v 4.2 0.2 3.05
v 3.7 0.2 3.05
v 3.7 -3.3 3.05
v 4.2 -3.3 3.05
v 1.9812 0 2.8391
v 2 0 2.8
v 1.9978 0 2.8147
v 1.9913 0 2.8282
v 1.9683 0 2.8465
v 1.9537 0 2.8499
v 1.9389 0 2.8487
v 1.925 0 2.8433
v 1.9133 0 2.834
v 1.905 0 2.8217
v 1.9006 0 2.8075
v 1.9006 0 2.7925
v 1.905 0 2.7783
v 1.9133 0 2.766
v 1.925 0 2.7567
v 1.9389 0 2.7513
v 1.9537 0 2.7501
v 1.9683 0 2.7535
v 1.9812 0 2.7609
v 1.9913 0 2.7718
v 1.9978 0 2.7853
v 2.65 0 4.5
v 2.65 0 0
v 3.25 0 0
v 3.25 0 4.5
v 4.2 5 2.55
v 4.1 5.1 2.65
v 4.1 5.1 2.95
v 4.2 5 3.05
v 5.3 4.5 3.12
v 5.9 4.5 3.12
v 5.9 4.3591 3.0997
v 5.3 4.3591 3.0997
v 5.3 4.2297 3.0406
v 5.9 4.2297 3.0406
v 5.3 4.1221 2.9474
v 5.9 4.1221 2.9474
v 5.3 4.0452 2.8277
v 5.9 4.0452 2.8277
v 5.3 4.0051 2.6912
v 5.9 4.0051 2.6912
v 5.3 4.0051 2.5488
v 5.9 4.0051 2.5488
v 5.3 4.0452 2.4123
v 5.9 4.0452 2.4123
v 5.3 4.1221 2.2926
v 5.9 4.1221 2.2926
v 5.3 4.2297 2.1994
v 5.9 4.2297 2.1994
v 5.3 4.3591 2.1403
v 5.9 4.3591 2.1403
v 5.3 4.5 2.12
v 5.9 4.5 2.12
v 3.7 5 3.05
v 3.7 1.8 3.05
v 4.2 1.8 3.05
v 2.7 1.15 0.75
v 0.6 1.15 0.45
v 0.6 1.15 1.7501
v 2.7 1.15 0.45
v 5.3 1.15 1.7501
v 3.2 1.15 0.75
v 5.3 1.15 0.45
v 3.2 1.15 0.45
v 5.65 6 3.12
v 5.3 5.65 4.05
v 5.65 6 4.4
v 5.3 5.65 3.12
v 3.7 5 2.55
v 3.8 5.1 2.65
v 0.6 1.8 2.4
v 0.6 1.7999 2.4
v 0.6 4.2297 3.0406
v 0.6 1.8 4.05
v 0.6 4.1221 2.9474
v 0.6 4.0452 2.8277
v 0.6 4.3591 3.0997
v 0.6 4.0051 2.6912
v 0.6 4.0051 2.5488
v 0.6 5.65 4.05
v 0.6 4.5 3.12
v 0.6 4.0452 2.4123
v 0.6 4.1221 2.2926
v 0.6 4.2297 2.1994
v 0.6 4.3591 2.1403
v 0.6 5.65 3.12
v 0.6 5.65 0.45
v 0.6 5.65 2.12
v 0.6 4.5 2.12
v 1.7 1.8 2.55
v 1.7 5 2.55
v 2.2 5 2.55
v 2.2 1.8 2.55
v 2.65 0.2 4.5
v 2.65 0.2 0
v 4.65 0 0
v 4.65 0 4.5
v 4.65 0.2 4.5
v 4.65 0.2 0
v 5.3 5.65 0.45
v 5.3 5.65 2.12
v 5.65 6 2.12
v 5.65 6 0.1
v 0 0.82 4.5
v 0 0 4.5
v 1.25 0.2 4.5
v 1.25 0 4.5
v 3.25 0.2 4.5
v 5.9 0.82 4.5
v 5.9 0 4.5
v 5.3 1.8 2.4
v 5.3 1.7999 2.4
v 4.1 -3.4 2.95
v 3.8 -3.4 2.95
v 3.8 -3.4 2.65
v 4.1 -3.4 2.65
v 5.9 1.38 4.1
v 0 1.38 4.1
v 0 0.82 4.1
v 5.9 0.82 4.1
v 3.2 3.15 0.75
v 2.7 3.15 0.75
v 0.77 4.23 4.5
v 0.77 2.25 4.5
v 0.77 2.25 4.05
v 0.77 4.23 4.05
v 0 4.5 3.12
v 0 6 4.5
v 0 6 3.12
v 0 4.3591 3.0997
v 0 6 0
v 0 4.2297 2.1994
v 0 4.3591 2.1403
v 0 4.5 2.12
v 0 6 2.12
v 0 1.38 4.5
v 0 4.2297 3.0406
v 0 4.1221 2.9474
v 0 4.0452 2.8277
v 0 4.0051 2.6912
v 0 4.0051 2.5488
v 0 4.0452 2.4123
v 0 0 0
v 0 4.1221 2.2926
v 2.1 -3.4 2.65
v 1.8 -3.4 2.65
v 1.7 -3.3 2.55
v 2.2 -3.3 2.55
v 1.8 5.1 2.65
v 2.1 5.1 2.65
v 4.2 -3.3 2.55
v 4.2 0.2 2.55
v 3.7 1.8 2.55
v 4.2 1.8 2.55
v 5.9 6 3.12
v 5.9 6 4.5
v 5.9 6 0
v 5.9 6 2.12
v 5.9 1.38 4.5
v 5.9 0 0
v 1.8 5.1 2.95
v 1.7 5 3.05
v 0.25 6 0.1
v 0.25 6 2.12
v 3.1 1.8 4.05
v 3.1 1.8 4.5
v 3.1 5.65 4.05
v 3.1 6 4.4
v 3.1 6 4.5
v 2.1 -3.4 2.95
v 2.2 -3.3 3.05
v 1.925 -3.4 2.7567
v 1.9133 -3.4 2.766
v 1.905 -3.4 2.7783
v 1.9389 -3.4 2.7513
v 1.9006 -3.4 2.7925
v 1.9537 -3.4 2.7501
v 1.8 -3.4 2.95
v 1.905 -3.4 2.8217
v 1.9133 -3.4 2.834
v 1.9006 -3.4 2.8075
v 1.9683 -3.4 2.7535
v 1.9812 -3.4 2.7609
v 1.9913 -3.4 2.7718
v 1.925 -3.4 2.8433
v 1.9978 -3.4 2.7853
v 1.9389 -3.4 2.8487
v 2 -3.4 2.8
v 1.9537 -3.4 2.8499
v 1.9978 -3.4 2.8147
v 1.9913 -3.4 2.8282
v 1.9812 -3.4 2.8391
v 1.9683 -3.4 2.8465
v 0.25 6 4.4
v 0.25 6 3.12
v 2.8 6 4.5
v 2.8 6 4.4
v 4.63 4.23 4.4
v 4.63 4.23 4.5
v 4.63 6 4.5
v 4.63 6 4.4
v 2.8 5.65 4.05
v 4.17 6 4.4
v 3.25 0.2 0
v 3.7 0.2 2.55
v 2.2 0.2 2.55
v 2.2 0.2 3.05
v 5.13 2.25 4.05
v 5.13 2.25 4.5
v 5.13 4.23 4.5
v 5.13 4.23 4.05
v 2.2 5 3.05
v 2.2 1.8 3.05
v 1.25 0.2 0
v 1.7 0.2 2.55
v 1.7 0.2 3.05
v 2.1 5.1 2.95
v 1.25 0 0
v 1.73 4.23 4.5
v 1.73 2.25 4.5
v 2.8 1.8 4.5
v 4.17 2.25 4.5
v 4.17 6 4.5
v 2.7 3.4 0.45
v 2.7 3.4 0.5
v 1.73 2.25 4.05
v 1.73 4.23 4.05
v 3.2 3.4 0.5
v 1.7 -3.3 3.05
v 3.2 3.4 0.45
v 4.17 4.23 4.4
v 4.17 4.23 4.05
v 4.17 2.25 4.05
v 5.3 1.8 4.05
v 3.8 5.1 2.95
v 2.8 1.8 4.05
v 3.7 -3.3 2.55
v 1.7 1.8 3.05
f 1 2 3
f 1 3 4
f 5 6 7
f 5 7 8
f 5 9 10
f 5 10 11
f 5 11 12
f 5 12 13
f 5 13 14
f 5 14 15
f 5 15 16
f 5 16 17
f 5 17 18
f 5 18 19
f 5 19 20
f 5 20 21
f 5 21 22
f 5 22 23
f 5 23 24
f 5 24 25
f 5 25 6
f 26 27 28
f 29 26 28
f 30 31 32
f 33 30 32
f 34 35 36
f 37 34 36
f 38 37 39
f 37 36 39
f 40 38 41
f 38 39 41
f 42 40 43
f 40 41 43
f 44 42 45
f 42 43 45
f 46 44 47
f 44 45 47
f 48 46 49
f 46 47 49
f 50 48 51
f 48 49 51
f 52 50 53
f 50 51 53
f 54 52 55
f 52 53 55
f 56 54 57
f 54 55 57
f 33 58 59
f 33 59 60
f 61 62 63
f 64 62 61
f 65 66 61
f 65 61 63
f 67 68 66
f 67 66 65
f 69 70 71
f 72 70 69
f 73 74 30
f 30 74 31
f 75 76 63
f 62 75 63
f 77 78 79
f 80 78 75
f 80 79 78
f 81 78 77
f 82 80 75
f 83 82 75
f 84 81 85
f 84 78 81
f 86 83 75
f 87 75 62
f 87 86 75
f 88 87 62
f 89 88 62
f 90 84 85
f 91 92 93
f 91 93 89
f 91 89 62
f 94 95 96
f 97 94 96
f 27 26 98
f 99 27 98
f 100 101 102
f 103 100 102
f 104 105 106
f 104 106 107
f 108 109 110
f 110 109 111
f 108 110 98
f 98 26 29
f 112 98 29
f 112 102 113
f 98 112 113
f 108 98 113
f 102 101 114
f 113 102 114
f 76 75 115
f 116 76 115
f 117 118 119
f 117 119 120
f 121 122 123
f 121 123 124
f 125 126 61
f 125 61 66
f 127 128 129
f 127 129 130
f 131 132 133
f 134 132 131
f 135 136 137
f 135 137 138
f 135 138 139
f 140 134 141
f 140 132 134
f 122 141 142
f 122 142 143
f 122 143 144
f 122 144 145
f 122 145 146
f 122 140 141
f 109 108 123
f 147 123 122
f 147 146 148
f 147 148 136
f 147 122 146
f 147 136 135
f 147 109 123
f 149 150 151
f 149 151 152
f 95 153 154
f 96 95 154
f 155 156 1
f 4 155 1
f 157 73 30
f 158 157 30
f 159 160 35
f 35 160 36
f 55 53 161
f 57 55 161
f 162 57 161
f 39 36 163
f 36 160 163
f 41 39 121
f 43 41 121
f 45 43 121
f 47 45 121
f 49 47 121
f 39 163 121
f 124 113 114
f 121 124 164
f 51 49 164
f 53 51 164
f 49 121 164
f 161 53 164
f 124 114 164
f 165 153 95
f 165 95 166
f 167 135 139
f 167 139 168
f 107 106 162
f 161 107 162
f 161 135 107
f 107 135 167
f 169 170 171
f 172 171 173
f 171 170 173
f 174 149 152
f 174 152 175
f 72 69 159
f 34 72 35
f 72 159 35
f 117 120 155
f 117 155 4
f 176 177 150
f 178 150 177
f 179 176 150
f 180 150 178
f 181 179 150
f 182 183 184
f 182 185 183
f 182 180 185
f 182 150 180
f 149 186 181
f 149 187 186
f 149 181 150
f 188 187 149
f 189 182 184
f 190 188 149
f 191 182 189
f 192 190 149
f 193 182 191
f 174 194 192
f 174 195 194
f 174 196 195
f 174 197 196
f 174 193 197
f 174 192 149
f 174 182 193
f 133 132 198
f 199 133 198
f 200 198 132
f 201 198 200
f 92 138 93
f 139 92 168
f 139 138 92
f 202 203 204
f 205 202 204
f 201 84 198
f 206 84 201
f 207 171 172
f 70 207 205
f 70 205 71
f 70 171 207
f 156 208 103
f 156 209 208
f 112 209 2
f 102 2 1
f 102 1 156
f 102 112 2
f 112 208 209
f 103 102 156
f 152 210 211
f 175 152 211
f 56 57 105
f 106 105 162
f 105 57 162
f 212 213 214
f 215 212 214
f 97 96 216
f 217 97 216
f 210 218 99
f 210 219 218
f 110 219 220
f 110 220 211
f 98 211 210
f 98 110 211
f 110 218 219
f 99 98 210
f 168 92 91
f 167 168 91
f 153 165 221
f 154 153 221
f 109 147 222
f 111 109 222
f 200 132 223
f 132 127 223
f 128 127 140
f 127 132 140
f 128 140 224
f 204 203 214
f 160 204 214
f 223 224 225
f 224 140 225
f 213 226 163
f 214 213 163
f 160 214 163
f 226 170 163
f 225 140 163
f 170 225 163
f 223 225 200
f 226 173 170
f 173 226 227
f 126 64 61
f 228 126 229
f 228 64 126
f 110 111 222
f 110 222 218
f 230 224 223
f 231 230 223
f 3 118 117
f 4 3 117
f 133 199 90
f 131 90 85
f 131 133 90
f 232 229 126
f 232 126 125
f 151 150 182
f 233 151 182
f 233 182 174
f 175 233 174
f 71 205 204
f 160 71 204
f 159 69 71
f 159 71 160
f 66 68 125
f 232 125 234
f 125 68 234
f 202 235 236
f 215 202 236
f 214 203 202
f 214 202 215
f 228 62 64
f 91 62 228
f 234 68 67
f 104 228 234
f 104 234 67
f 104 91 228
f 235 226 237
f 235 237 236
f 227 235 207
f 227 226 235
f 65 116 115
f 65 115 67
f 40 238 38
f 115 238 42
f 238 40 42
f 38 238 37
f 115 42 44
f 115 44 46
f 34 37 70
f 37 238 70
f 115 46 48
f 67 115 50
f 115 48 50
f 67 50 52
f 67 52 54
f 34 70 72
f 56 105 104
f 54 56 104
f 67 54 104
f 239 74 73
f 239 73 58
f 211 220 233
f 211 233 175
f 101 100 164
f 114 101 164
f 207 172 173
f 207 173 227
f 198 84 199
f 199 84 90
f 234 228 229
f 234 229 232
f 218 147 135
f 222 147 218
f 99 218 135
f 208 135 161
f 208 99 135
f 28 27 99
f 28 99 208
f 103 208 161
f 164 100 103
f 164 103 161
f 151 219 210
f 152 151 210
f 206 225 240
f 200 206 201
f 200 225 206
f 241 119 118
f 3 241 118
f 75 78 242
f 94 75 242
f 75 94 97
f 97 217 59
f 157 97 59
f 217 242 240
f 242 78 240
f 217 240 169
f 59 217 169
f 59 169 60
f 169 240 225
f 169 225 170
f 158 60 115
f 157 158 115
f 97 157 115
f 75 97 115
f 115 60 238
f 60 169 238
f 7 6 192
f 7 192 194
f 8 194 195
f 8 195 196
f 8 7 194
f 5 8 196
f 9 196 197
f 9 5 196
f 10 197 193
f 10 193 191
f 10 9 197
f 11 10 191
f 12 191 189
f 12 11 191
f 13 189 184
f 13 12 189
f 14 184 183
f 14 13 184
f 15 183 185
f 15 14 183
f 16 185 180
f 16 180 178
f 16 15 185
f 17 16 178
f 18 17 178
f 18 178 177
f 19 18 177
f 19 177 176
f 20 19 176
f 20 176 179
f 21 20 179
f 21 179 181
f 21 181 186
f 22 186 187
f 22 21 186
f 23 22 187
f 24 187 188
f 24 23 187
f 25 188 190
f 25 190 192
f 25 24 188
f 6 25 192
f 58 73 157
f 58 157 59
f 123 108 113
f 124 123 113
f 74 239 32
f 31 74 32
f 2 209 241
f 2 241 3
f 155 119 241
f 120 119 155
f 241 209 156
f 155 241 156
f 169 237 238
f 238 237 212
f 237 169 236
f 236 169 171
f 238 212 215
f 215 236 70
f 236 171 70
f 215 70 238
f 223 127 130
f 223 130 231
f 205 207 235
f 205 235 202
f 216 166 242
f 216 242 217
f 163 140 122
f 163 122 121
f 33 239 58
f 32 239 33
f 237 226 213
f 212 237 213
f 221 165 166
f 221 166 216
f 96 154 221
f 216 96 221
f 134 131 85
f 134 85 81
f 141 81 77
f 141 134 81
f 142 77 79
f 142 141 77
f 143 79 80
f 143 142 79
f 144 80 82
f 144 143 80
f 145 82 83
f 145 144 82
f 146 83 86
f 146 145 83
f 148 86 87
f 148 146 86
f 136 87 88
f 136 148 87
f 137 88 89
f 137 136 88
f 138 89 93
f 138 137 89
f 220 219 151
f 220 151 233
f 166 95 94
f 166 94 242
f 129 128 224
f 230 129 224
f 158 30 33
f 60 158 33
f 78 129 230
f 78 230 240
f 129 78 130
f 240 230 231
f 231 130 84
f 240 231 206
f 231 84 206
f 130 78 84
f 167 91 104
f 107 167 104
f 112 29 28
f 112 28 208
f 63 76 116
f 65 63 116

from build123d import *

# Parameters (mm, degrees)
BODY1_W                            = 5.9
BODY1_H                            = 4.5
EXTRUDE_1_DEPTH                    = 6
SKETCH_2_W                         = 4.7
SKETCH_2_H                         = 3.6
CUT_EXTRUDE_1_DEPTH                = 4.2
SKETCH_3_W                         = 5.9
SKETCH_3_H                         = 0.56
CUT_EXTRUDE_2_DEPTH                = 0.4
CHAMFER_1_SIZE                     = 0.35
CUT_EXTRUDE_3_REACH                = 11.543
SKETCH_4_W                         = 0.96
SKETCH_4_H                         = 1.98
SKETCH_5_W                         = 1.4
SKETCH_5_H                         = 0.2
CUT_EXTRUDE_4_DEPTH                = 10.54253635
SKETCH_7_W                         = 0.46
SKETCH_7_H                         = 1.77
CUT_EXTRUDE_5_DEPTH                = 0.1
CUT_EXTRUDE_6_REACH                = 11.543
SKETCH_8_W                         = 0.3
SKETCH_8_H                         = 4.2
CUT_EXTRUDE_7_REACH                = 11.543
SKETCH_15_W                        = 4.7
SKETCH_15_H                        = 1.95
CUT_EXTRUDE_9_DEPTH                = 0.65
CHAMFER_7_SIZE                     = 0.65
SKETCH_10_W                        = 0.5
SKETCH_10_H                        = 2.25
EXTRUDE_2_DEPTH                    = 0.3
CHAMFER_2_SIZE                     = 0.25
EXTRUDE_START                      = -4.9
SKETCH_12_W                        = 0.5
SKETCH_12_H                        = 0.5
EXTRUDE_4_DEPTH                    = 8.5
CHAMFER_3_SIZE                     = 0.1
CHAMFER_4_SIZE                     = 0.1
PATTERN_LINEAR_2_COUNT             = 2
PATTERN_LINEAR_2_PITCH             = 2
CHAMFER_3_OF_PATTERN_LINEAR_2_SIZE = 0.1
CHAMFER_4_OF_PATTERN_LINEAR_2_SIZE = 0.1
SKETCH_16_R                        = 0.05
CUT_EXTRUDE_10_DEPTH               = 3.4


with BuildPart() as part:
    # Body1 → Бобышка-Вытянуть1 (new body)
    with BuildSketch(Plane(origin=(0, 0, 0), x_dir=(1, 0, 0), z_dir=(0, 1, 0))):
        with Locations((2.95, -2.25)):
            Rectangle(BODY1_W, BODY1_H)
    extrude(amount=EXTRUDE_1_DEPTH)

    # Эскиз2 → Вырез-Вытянуть1 (cut)
    with BuildSketch(Plane(origin=(0, 6, 0), x_dir=(1, 0, 0), z_dir=(0, 1, 0))):
        with Locations((2.95, -2.25)):
            Rectangle(SKETCH_2_W, SKETCH_2_H)
    extrude(amount=-CUT_EXTRUDE_1_DEPTH, mode=Mode.SUBTRACT)

    # Эскиз3 → Вырез-Вытянуть2 (cut)
    with BuildSketch(Plane.XY.offset(4.5)):
        with Locations((2.95, 1.1)):
            Rectangle(SKETCH_3_W, SKETCH_3_H)
    extrude(amount=-CUT_EXTRUDE_2_DEPTH, mode=Mode.SUBTRACT)

    # Фаска1
    chamfer_1_edges = [part.edges().sort_by_distance(p)[0] for p in [
        (2.95, 6, 4.05),
        (5.3, 6, 2.25),
        (2.95, 6, 0.45),
        (0.6, 6, 2.25),
    ]]
    chamfer(chamfer_1_edges, length=CHAMFER_1_SIZE)

    # Эскиз4 → Вырез-Вытянуть3 (cut, up to next)
    with BuildSketch(Plane.XY.offset(4.5), mode=Mode.PRIVATE) as cut_extrude_3_sk1:
        with Locations((1.25, 3.24)):
            Rectangle(SKETCH_4_W, SKETCH_4_H)
    cut_extrude_3_tool1 = extrude(cut_extrude_3_sk1.sketch, amount=-CUT_EXTRUDE_3_REACH, mode=Mode.PRIVATE) & part.part
    # Эскиз4 → Вырез-Вытянуть3 (cut, up to next)
    with BuildSketch(Plane.XY.offset(4.5), mode=Mode.PRIVATE) as cut_extrude_3_sk2:
        with Locations((4.65, 3.24)):
            Rectangle(SKETCH_4_W, SKETCH_4_H)
    cut_extrude_3_tool2 = extrude(cut_extrude_3_sk2.sketch, amount=-CUT_EXTRUDE_3_REACH, mode=Mode.PRIVATE) & part.part
    add(cut_extrude_3_tool1.solids().sort_by_distance((1.25, 3.24, 4.5))[0], mode=Mode.SUBTRACT)
    add(cut_extrude_3_tool2.solids().sort_by_distance((4.65, 3.24, 4.5))[0], mode=Mode.SUBTRACT)

    # Эскиз5 → Вырез-Вытянуть4 (cut, through all)
    with BuildSketch(Plane.XY.offset(4.5)):
        with Locations((1.95, 0.1)):
            Rectangle(SKETCH_5_W, SKETCH_5_H)
    cut_extrude_4 = extrude(amount=-CUT_EXTRUDE_4_DEPTH, mode=Mode.SUBTRACT)

    # Эскиз7 → Вырез-Вытянуть5 (cut)
    with BuildSketch(Plane.XY.offset(4.5)):
        with Locations((4.4, 5.115)):
            Rectangle(SKETCH_7_W, SKETCH_7_H)
    extrude(amount=-CUT_EXTRUDE_5_DEPTH, mode=Mode.SUBTRACT)

    # Эскиз8 → Вырез-Вытянуть6 (cut, up to next)
    with BuildSketch(Plane.XY.offset(4.5), mode=Mode.PRIVATE) as cut_extrude_6_sk1:
        with Locations((2.95, 3.9)):
            Rectangle(SKETCH_8_W, SKETCH_8_H)
    cut_extrude_6_tool1 = extrude(cut_extrude_6_sk1.sketch, amount=-CUT_EXTRUDE_6_REACH, mode=Mode.PRIVATE) & part.part
    add(cut_extrude_6_tool1.solids().sort_by_distance((2.95, 3.9, 4.5))[0], mode=Mode.SUBTRACT)

    # Эскиз9 → Вырез-Вытянуть7 (cut, up to next)
    with BuildSketch(Plane.ZY, mode=Mode.PRIVATE) as cut_extrude_7_sk1:
        with BuildLine():
            Line((2.12, 6), (3.12, 6))
            Line((3.12, 6), (3.12, 4.5))
            ThreePointArc((3.12, 4.5), (2.62, 4), (2.12, 4.5))
            Line((2.12, 4.5), (2.12, 6))
        make_face()
    cut_extrude_7_tool1 = extrude(cut_extrude_7_sk1.sketch, amount=-CUT_EXTRUDE_7_REACH, mode=Mode.PRIVATE) & part.part
    cut_extrude_7 = cut_extrude_7_tool1.solids().sort_by_distance((0, 5.05036, 2.62))[0]
    add(cut_extrude_7, mode=Mode.SUBTRACT)

    # Зеркальное отражение1: Вырез-Вытянуть7 across plane
    add(cut_extrude_7.mirror(Plane(origin=(2.95, 0, 0), x_dir=(0, 0, 1), z_dir=(1, 0, 0))), mode=Mode.SUBTRACT)

    # Эскиз15 → Вырез-Вытянуть9 (cut)
    with BuildSketch(Plane(origin=(0, 1.8, 0), x_dir=(1, 0, 0), z_dir=(0, 1, 0))):
        with Locations((2.95, -1.425)):
            Rectangle(SKETCH_15_W, SKETCH_15_H)
    extrude(amount=-CUT_EXTRUDE_9_DEPTH, mode=Mode.SUBTRACT)

    # Фаска7
    chamfer_7_edges = [part.edges().sort_by_distance(p)[0] for p in [
        (2.95, 1.15, 2.4),
    ]]
    chamfer(chamfer_7_edges, length=CHAMFER_7_SIZE - 0.0001)  # a hair under: the kernel refuses the full size

    # Эскиз10 → Бобышка-Вытянуть2 (add)
    with BuildSketch(Plane.XY.offset(0.45)):
        with Locations((2.95, 2.275)):
            Rectangle(SKETCH_10_W, SKETCH_10_H)
    extrude(amount=EXTRUDE_2_DEPTH)

    # Фаска2
    chamfer_2_edges = [part.edges().sort_by_distance(p)[0] for p in [
        (2.95, 3.4, 0.75),
    ]]
    chamfer(chamfer_2_edges, length=CHAMFER_2_SIZE)

    # Эскиз12 → Бобышка-Вытянуть4 (add)
    with BuildSketch(Plane.XZ.offset(-0.2).offset(EXTRUDE_START)):
        with Locations((1.95, 2.8)):
            Rectangle(SKETCH_12_W, SKETCH_12_H)
    extrude_4 = extrude(amount=EXTRUDE_4_DEPTH)

    # Фаска3
    chamfer_3_edges = [part.edges().sort_by_distance(p)[0] for p in [
        (1.7, -3.4, 2.8),
        (1.95, -3.4, 2.55),
        (2.2, -3.4, 2.8),
        (1.95, -3.4, 3.05),
    ]]
    chamfer(chamfer_3_edges, length=CHAMFER_3_SIZE)

    # Фаска4
    chamfer_4_edges = [part.edges().sort_by_distance(p)[0] for p in [
        (1.7, 5.1, 2.8),
        (1.95, 5.1, 2.55),
        (2.2, 5.1, 2.8),
        (1.95, 5.1, 3.05),
    ]]
    chamfer(chamfer_4_edges, length=CHAMFER_4_SIZE)

    # Линейный массив2: Вырез-Вытянуть4, Бобышка-Вытянуть4 ×2
    with Locations(*[(i * PATTERN_LINEAR_2_PITCH, 0, 0) for i in range(1, PATTERN_LINEAR_2_COUNT)]):
        add(cut_extrude_4, mode=Mode.SUBTRACT)
        add(extrude_4)

    # Фаска3 of Линейный массив2
    chamfer_3_of_pattern_linear_2_edges = [part.edges().sort_by_distance(p)[0] for p in [
        (3.7, -3.4, 2.8),
        (3.95, -3.4, 2.55),
        (4.2, -3.4, 2.8),
        (3.95, -3.4, 3.05),
    ]]
    chamfer(chamfer_3_of_pattern_linear_2_edges, length=CHAMFER_3_OF_PATTERN_LINEAR_2_SIZE)

    # Фаска4 of Линейный массив2
    chamfer_4_of_pattern_linear_2_edges = [part.edges().sort_by_distance(p)[0] for p in [
        (3.7, 5.1, 2.8),
        (3.95, 5.1, 2.55),
        (4.2, 5.1, 2.8),
        (3.95, 5.1, 3.05),
    ]]
    chamfer(chamfer_4_of_pattern_linear_2_edges, length=CHAMFER_4_OF_PATTERN_LINEAR_2_SIZE)

    # Эскиз16 → Вырез-Вытянуть10 (cut)
    with BuildSketch(Plane.XZ):
        with Locations((1.95, 2.8)):
            Circle(SKETCH_16_R)
    extrude(amount=CUT_EXTRUDE_10_DEPTH, mode=Mode.SUBTRACT)


solid = part.part
